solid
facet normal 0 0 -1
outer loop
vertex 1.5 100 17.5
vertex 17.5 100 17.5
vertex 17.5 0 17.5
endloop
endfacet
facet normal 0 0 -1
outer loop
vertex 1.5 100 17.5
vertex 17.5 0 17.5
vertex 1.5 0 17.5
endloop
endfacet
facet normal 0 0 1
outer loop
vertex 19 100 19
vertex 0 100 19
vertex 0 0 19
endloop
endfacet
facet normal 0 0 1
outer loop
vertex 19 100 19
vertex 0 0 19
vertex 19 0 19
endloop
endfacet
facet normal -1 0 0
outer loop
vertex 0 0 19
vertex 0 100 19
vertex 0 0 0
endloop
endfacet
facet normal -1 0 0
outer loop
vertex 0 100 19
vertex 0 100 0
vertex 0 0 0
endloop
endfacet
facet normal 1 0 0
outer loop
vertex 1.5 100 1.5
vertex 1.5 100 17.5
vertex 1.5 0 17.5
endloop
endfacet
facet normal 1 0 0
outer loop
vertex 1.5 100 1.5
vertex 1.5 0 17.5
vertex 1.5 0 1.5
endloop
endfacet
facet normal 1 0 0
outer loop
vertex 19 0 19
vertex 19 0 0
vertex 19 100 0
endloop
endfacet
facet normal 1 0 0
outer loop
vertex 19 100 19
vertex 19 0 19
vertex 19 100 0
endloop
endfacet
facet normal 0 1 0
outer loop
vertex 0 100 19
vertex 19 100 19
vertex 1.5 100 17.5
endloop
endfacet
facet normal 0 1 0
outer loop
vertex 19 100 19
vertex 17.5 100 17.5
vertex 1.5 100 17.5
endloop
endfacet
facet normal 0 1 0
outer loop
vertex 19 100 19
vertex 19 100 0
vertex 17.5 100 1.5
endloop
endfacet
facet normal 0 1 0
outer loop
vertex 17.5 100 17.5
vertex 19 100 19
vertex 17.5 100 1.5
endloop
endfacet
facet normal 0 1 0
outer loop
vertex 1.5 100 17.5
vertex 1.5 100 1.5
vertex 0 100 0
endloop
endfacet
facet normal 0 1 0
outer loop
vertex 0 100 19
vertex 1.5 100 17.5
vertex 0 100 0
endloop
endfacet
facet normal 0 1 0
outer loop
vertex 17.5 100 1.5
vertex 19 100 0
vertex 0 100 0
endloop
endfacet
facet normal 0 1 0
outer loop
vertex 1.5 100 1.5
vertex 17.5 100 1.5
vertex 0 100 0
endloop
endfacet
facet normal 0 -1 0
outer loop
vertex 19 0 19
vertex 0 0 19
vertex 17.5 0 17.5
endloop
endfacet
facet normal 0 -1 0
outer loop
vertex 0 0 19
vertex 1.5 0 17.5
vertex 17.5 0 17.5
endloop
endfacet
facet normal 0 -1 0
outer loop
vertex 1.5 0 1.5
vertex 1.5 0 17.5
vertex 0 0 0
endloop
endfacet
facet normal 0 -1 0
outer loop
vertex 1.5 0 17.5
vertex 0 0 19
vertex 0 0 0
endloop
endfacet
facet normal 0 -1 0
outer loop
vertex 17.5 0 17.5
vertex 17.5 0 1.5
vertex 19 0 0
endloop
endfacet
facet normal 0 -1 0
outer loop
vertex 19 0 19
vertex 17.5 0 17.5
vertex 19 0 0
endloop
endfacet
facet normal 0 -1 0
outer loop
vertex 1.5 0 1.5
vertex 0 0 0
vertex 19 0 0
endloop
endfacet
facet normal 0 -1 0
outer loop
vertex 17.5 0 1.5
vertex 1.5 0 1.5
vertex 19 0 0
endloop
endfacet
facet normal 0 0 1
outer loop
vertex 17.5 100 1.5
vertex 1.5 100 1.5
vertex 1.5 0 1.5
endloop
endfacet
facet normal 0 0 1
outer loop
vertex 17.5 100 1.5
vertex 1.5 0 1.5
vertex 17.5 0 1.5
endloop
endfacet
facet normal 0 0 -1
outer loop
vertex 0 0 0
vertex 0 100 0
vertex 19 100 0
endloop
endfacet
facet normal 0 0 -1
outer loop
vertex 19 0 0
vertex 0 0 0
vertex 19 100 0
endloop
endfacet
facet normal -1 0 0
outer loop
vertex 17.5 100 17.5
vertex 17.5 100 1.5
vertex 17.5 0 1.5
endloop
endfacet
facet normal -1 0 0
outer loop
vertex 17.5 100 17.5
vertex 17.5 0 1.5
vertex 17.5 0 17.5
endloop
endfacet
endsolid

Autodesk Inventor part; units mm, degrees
ref_plane "YZ Plane" through (0, 0, 0) normal (1, 0, 0) x (0, 1, 0)
ref_plane "XZ Plane" through (0, 0, 0) normal (0, 1, 0) x (-1, 0, 0)
ref_plane "XY Plane" through (0, 0, 0) normal (0, 0, 1) x (1, 0, 0)
sketch "Sketch1" plane through (0, 0, 0) normal (0, 0, 1) x (1, 0, 0)
  line L0 (0, 0) -> (19, 0)
  line L1 (19, 0) -> (19, 100)
  line L2 (19, 100) -> (0, 100)
  line L3 (0, 100) -> (0, 0)
  dimension "d0" = 19
  dimension "d1" = 100
extrude "Extrusion1" add sketch "Sketch1" along normal blind 19
sketch "Sketch3" plane through (0, 100, 0) normal (0, 1, 0) x (1, 0, 0)
  line L0 (19, 0) -> (0, 0) projected
  line L1 (0, 0) -> (0, -19) projected
  line L2 (19, -19) -> (0, -19) projected
  line L3 (19, 0) -> (19, -19) projected
  line L4 (1.5, -17.5) -> (1.5, -1.5)
  line L5 (1.5, -1.5) -> (17.5, -1.5)
  line L6 (17.5, -1.5) -> (17.5, -17.5)
  line L7 (17.5, -17.5) -> (1.5, -17.5)
  point P0 (0, 0)
  dimension "d4" = 1.5
extrude "Extrusion2" cut sketch "Sketch3" against normal through all contours L4 L5 L6 L7
properties part number "C006" material "Aluminum 6061"
